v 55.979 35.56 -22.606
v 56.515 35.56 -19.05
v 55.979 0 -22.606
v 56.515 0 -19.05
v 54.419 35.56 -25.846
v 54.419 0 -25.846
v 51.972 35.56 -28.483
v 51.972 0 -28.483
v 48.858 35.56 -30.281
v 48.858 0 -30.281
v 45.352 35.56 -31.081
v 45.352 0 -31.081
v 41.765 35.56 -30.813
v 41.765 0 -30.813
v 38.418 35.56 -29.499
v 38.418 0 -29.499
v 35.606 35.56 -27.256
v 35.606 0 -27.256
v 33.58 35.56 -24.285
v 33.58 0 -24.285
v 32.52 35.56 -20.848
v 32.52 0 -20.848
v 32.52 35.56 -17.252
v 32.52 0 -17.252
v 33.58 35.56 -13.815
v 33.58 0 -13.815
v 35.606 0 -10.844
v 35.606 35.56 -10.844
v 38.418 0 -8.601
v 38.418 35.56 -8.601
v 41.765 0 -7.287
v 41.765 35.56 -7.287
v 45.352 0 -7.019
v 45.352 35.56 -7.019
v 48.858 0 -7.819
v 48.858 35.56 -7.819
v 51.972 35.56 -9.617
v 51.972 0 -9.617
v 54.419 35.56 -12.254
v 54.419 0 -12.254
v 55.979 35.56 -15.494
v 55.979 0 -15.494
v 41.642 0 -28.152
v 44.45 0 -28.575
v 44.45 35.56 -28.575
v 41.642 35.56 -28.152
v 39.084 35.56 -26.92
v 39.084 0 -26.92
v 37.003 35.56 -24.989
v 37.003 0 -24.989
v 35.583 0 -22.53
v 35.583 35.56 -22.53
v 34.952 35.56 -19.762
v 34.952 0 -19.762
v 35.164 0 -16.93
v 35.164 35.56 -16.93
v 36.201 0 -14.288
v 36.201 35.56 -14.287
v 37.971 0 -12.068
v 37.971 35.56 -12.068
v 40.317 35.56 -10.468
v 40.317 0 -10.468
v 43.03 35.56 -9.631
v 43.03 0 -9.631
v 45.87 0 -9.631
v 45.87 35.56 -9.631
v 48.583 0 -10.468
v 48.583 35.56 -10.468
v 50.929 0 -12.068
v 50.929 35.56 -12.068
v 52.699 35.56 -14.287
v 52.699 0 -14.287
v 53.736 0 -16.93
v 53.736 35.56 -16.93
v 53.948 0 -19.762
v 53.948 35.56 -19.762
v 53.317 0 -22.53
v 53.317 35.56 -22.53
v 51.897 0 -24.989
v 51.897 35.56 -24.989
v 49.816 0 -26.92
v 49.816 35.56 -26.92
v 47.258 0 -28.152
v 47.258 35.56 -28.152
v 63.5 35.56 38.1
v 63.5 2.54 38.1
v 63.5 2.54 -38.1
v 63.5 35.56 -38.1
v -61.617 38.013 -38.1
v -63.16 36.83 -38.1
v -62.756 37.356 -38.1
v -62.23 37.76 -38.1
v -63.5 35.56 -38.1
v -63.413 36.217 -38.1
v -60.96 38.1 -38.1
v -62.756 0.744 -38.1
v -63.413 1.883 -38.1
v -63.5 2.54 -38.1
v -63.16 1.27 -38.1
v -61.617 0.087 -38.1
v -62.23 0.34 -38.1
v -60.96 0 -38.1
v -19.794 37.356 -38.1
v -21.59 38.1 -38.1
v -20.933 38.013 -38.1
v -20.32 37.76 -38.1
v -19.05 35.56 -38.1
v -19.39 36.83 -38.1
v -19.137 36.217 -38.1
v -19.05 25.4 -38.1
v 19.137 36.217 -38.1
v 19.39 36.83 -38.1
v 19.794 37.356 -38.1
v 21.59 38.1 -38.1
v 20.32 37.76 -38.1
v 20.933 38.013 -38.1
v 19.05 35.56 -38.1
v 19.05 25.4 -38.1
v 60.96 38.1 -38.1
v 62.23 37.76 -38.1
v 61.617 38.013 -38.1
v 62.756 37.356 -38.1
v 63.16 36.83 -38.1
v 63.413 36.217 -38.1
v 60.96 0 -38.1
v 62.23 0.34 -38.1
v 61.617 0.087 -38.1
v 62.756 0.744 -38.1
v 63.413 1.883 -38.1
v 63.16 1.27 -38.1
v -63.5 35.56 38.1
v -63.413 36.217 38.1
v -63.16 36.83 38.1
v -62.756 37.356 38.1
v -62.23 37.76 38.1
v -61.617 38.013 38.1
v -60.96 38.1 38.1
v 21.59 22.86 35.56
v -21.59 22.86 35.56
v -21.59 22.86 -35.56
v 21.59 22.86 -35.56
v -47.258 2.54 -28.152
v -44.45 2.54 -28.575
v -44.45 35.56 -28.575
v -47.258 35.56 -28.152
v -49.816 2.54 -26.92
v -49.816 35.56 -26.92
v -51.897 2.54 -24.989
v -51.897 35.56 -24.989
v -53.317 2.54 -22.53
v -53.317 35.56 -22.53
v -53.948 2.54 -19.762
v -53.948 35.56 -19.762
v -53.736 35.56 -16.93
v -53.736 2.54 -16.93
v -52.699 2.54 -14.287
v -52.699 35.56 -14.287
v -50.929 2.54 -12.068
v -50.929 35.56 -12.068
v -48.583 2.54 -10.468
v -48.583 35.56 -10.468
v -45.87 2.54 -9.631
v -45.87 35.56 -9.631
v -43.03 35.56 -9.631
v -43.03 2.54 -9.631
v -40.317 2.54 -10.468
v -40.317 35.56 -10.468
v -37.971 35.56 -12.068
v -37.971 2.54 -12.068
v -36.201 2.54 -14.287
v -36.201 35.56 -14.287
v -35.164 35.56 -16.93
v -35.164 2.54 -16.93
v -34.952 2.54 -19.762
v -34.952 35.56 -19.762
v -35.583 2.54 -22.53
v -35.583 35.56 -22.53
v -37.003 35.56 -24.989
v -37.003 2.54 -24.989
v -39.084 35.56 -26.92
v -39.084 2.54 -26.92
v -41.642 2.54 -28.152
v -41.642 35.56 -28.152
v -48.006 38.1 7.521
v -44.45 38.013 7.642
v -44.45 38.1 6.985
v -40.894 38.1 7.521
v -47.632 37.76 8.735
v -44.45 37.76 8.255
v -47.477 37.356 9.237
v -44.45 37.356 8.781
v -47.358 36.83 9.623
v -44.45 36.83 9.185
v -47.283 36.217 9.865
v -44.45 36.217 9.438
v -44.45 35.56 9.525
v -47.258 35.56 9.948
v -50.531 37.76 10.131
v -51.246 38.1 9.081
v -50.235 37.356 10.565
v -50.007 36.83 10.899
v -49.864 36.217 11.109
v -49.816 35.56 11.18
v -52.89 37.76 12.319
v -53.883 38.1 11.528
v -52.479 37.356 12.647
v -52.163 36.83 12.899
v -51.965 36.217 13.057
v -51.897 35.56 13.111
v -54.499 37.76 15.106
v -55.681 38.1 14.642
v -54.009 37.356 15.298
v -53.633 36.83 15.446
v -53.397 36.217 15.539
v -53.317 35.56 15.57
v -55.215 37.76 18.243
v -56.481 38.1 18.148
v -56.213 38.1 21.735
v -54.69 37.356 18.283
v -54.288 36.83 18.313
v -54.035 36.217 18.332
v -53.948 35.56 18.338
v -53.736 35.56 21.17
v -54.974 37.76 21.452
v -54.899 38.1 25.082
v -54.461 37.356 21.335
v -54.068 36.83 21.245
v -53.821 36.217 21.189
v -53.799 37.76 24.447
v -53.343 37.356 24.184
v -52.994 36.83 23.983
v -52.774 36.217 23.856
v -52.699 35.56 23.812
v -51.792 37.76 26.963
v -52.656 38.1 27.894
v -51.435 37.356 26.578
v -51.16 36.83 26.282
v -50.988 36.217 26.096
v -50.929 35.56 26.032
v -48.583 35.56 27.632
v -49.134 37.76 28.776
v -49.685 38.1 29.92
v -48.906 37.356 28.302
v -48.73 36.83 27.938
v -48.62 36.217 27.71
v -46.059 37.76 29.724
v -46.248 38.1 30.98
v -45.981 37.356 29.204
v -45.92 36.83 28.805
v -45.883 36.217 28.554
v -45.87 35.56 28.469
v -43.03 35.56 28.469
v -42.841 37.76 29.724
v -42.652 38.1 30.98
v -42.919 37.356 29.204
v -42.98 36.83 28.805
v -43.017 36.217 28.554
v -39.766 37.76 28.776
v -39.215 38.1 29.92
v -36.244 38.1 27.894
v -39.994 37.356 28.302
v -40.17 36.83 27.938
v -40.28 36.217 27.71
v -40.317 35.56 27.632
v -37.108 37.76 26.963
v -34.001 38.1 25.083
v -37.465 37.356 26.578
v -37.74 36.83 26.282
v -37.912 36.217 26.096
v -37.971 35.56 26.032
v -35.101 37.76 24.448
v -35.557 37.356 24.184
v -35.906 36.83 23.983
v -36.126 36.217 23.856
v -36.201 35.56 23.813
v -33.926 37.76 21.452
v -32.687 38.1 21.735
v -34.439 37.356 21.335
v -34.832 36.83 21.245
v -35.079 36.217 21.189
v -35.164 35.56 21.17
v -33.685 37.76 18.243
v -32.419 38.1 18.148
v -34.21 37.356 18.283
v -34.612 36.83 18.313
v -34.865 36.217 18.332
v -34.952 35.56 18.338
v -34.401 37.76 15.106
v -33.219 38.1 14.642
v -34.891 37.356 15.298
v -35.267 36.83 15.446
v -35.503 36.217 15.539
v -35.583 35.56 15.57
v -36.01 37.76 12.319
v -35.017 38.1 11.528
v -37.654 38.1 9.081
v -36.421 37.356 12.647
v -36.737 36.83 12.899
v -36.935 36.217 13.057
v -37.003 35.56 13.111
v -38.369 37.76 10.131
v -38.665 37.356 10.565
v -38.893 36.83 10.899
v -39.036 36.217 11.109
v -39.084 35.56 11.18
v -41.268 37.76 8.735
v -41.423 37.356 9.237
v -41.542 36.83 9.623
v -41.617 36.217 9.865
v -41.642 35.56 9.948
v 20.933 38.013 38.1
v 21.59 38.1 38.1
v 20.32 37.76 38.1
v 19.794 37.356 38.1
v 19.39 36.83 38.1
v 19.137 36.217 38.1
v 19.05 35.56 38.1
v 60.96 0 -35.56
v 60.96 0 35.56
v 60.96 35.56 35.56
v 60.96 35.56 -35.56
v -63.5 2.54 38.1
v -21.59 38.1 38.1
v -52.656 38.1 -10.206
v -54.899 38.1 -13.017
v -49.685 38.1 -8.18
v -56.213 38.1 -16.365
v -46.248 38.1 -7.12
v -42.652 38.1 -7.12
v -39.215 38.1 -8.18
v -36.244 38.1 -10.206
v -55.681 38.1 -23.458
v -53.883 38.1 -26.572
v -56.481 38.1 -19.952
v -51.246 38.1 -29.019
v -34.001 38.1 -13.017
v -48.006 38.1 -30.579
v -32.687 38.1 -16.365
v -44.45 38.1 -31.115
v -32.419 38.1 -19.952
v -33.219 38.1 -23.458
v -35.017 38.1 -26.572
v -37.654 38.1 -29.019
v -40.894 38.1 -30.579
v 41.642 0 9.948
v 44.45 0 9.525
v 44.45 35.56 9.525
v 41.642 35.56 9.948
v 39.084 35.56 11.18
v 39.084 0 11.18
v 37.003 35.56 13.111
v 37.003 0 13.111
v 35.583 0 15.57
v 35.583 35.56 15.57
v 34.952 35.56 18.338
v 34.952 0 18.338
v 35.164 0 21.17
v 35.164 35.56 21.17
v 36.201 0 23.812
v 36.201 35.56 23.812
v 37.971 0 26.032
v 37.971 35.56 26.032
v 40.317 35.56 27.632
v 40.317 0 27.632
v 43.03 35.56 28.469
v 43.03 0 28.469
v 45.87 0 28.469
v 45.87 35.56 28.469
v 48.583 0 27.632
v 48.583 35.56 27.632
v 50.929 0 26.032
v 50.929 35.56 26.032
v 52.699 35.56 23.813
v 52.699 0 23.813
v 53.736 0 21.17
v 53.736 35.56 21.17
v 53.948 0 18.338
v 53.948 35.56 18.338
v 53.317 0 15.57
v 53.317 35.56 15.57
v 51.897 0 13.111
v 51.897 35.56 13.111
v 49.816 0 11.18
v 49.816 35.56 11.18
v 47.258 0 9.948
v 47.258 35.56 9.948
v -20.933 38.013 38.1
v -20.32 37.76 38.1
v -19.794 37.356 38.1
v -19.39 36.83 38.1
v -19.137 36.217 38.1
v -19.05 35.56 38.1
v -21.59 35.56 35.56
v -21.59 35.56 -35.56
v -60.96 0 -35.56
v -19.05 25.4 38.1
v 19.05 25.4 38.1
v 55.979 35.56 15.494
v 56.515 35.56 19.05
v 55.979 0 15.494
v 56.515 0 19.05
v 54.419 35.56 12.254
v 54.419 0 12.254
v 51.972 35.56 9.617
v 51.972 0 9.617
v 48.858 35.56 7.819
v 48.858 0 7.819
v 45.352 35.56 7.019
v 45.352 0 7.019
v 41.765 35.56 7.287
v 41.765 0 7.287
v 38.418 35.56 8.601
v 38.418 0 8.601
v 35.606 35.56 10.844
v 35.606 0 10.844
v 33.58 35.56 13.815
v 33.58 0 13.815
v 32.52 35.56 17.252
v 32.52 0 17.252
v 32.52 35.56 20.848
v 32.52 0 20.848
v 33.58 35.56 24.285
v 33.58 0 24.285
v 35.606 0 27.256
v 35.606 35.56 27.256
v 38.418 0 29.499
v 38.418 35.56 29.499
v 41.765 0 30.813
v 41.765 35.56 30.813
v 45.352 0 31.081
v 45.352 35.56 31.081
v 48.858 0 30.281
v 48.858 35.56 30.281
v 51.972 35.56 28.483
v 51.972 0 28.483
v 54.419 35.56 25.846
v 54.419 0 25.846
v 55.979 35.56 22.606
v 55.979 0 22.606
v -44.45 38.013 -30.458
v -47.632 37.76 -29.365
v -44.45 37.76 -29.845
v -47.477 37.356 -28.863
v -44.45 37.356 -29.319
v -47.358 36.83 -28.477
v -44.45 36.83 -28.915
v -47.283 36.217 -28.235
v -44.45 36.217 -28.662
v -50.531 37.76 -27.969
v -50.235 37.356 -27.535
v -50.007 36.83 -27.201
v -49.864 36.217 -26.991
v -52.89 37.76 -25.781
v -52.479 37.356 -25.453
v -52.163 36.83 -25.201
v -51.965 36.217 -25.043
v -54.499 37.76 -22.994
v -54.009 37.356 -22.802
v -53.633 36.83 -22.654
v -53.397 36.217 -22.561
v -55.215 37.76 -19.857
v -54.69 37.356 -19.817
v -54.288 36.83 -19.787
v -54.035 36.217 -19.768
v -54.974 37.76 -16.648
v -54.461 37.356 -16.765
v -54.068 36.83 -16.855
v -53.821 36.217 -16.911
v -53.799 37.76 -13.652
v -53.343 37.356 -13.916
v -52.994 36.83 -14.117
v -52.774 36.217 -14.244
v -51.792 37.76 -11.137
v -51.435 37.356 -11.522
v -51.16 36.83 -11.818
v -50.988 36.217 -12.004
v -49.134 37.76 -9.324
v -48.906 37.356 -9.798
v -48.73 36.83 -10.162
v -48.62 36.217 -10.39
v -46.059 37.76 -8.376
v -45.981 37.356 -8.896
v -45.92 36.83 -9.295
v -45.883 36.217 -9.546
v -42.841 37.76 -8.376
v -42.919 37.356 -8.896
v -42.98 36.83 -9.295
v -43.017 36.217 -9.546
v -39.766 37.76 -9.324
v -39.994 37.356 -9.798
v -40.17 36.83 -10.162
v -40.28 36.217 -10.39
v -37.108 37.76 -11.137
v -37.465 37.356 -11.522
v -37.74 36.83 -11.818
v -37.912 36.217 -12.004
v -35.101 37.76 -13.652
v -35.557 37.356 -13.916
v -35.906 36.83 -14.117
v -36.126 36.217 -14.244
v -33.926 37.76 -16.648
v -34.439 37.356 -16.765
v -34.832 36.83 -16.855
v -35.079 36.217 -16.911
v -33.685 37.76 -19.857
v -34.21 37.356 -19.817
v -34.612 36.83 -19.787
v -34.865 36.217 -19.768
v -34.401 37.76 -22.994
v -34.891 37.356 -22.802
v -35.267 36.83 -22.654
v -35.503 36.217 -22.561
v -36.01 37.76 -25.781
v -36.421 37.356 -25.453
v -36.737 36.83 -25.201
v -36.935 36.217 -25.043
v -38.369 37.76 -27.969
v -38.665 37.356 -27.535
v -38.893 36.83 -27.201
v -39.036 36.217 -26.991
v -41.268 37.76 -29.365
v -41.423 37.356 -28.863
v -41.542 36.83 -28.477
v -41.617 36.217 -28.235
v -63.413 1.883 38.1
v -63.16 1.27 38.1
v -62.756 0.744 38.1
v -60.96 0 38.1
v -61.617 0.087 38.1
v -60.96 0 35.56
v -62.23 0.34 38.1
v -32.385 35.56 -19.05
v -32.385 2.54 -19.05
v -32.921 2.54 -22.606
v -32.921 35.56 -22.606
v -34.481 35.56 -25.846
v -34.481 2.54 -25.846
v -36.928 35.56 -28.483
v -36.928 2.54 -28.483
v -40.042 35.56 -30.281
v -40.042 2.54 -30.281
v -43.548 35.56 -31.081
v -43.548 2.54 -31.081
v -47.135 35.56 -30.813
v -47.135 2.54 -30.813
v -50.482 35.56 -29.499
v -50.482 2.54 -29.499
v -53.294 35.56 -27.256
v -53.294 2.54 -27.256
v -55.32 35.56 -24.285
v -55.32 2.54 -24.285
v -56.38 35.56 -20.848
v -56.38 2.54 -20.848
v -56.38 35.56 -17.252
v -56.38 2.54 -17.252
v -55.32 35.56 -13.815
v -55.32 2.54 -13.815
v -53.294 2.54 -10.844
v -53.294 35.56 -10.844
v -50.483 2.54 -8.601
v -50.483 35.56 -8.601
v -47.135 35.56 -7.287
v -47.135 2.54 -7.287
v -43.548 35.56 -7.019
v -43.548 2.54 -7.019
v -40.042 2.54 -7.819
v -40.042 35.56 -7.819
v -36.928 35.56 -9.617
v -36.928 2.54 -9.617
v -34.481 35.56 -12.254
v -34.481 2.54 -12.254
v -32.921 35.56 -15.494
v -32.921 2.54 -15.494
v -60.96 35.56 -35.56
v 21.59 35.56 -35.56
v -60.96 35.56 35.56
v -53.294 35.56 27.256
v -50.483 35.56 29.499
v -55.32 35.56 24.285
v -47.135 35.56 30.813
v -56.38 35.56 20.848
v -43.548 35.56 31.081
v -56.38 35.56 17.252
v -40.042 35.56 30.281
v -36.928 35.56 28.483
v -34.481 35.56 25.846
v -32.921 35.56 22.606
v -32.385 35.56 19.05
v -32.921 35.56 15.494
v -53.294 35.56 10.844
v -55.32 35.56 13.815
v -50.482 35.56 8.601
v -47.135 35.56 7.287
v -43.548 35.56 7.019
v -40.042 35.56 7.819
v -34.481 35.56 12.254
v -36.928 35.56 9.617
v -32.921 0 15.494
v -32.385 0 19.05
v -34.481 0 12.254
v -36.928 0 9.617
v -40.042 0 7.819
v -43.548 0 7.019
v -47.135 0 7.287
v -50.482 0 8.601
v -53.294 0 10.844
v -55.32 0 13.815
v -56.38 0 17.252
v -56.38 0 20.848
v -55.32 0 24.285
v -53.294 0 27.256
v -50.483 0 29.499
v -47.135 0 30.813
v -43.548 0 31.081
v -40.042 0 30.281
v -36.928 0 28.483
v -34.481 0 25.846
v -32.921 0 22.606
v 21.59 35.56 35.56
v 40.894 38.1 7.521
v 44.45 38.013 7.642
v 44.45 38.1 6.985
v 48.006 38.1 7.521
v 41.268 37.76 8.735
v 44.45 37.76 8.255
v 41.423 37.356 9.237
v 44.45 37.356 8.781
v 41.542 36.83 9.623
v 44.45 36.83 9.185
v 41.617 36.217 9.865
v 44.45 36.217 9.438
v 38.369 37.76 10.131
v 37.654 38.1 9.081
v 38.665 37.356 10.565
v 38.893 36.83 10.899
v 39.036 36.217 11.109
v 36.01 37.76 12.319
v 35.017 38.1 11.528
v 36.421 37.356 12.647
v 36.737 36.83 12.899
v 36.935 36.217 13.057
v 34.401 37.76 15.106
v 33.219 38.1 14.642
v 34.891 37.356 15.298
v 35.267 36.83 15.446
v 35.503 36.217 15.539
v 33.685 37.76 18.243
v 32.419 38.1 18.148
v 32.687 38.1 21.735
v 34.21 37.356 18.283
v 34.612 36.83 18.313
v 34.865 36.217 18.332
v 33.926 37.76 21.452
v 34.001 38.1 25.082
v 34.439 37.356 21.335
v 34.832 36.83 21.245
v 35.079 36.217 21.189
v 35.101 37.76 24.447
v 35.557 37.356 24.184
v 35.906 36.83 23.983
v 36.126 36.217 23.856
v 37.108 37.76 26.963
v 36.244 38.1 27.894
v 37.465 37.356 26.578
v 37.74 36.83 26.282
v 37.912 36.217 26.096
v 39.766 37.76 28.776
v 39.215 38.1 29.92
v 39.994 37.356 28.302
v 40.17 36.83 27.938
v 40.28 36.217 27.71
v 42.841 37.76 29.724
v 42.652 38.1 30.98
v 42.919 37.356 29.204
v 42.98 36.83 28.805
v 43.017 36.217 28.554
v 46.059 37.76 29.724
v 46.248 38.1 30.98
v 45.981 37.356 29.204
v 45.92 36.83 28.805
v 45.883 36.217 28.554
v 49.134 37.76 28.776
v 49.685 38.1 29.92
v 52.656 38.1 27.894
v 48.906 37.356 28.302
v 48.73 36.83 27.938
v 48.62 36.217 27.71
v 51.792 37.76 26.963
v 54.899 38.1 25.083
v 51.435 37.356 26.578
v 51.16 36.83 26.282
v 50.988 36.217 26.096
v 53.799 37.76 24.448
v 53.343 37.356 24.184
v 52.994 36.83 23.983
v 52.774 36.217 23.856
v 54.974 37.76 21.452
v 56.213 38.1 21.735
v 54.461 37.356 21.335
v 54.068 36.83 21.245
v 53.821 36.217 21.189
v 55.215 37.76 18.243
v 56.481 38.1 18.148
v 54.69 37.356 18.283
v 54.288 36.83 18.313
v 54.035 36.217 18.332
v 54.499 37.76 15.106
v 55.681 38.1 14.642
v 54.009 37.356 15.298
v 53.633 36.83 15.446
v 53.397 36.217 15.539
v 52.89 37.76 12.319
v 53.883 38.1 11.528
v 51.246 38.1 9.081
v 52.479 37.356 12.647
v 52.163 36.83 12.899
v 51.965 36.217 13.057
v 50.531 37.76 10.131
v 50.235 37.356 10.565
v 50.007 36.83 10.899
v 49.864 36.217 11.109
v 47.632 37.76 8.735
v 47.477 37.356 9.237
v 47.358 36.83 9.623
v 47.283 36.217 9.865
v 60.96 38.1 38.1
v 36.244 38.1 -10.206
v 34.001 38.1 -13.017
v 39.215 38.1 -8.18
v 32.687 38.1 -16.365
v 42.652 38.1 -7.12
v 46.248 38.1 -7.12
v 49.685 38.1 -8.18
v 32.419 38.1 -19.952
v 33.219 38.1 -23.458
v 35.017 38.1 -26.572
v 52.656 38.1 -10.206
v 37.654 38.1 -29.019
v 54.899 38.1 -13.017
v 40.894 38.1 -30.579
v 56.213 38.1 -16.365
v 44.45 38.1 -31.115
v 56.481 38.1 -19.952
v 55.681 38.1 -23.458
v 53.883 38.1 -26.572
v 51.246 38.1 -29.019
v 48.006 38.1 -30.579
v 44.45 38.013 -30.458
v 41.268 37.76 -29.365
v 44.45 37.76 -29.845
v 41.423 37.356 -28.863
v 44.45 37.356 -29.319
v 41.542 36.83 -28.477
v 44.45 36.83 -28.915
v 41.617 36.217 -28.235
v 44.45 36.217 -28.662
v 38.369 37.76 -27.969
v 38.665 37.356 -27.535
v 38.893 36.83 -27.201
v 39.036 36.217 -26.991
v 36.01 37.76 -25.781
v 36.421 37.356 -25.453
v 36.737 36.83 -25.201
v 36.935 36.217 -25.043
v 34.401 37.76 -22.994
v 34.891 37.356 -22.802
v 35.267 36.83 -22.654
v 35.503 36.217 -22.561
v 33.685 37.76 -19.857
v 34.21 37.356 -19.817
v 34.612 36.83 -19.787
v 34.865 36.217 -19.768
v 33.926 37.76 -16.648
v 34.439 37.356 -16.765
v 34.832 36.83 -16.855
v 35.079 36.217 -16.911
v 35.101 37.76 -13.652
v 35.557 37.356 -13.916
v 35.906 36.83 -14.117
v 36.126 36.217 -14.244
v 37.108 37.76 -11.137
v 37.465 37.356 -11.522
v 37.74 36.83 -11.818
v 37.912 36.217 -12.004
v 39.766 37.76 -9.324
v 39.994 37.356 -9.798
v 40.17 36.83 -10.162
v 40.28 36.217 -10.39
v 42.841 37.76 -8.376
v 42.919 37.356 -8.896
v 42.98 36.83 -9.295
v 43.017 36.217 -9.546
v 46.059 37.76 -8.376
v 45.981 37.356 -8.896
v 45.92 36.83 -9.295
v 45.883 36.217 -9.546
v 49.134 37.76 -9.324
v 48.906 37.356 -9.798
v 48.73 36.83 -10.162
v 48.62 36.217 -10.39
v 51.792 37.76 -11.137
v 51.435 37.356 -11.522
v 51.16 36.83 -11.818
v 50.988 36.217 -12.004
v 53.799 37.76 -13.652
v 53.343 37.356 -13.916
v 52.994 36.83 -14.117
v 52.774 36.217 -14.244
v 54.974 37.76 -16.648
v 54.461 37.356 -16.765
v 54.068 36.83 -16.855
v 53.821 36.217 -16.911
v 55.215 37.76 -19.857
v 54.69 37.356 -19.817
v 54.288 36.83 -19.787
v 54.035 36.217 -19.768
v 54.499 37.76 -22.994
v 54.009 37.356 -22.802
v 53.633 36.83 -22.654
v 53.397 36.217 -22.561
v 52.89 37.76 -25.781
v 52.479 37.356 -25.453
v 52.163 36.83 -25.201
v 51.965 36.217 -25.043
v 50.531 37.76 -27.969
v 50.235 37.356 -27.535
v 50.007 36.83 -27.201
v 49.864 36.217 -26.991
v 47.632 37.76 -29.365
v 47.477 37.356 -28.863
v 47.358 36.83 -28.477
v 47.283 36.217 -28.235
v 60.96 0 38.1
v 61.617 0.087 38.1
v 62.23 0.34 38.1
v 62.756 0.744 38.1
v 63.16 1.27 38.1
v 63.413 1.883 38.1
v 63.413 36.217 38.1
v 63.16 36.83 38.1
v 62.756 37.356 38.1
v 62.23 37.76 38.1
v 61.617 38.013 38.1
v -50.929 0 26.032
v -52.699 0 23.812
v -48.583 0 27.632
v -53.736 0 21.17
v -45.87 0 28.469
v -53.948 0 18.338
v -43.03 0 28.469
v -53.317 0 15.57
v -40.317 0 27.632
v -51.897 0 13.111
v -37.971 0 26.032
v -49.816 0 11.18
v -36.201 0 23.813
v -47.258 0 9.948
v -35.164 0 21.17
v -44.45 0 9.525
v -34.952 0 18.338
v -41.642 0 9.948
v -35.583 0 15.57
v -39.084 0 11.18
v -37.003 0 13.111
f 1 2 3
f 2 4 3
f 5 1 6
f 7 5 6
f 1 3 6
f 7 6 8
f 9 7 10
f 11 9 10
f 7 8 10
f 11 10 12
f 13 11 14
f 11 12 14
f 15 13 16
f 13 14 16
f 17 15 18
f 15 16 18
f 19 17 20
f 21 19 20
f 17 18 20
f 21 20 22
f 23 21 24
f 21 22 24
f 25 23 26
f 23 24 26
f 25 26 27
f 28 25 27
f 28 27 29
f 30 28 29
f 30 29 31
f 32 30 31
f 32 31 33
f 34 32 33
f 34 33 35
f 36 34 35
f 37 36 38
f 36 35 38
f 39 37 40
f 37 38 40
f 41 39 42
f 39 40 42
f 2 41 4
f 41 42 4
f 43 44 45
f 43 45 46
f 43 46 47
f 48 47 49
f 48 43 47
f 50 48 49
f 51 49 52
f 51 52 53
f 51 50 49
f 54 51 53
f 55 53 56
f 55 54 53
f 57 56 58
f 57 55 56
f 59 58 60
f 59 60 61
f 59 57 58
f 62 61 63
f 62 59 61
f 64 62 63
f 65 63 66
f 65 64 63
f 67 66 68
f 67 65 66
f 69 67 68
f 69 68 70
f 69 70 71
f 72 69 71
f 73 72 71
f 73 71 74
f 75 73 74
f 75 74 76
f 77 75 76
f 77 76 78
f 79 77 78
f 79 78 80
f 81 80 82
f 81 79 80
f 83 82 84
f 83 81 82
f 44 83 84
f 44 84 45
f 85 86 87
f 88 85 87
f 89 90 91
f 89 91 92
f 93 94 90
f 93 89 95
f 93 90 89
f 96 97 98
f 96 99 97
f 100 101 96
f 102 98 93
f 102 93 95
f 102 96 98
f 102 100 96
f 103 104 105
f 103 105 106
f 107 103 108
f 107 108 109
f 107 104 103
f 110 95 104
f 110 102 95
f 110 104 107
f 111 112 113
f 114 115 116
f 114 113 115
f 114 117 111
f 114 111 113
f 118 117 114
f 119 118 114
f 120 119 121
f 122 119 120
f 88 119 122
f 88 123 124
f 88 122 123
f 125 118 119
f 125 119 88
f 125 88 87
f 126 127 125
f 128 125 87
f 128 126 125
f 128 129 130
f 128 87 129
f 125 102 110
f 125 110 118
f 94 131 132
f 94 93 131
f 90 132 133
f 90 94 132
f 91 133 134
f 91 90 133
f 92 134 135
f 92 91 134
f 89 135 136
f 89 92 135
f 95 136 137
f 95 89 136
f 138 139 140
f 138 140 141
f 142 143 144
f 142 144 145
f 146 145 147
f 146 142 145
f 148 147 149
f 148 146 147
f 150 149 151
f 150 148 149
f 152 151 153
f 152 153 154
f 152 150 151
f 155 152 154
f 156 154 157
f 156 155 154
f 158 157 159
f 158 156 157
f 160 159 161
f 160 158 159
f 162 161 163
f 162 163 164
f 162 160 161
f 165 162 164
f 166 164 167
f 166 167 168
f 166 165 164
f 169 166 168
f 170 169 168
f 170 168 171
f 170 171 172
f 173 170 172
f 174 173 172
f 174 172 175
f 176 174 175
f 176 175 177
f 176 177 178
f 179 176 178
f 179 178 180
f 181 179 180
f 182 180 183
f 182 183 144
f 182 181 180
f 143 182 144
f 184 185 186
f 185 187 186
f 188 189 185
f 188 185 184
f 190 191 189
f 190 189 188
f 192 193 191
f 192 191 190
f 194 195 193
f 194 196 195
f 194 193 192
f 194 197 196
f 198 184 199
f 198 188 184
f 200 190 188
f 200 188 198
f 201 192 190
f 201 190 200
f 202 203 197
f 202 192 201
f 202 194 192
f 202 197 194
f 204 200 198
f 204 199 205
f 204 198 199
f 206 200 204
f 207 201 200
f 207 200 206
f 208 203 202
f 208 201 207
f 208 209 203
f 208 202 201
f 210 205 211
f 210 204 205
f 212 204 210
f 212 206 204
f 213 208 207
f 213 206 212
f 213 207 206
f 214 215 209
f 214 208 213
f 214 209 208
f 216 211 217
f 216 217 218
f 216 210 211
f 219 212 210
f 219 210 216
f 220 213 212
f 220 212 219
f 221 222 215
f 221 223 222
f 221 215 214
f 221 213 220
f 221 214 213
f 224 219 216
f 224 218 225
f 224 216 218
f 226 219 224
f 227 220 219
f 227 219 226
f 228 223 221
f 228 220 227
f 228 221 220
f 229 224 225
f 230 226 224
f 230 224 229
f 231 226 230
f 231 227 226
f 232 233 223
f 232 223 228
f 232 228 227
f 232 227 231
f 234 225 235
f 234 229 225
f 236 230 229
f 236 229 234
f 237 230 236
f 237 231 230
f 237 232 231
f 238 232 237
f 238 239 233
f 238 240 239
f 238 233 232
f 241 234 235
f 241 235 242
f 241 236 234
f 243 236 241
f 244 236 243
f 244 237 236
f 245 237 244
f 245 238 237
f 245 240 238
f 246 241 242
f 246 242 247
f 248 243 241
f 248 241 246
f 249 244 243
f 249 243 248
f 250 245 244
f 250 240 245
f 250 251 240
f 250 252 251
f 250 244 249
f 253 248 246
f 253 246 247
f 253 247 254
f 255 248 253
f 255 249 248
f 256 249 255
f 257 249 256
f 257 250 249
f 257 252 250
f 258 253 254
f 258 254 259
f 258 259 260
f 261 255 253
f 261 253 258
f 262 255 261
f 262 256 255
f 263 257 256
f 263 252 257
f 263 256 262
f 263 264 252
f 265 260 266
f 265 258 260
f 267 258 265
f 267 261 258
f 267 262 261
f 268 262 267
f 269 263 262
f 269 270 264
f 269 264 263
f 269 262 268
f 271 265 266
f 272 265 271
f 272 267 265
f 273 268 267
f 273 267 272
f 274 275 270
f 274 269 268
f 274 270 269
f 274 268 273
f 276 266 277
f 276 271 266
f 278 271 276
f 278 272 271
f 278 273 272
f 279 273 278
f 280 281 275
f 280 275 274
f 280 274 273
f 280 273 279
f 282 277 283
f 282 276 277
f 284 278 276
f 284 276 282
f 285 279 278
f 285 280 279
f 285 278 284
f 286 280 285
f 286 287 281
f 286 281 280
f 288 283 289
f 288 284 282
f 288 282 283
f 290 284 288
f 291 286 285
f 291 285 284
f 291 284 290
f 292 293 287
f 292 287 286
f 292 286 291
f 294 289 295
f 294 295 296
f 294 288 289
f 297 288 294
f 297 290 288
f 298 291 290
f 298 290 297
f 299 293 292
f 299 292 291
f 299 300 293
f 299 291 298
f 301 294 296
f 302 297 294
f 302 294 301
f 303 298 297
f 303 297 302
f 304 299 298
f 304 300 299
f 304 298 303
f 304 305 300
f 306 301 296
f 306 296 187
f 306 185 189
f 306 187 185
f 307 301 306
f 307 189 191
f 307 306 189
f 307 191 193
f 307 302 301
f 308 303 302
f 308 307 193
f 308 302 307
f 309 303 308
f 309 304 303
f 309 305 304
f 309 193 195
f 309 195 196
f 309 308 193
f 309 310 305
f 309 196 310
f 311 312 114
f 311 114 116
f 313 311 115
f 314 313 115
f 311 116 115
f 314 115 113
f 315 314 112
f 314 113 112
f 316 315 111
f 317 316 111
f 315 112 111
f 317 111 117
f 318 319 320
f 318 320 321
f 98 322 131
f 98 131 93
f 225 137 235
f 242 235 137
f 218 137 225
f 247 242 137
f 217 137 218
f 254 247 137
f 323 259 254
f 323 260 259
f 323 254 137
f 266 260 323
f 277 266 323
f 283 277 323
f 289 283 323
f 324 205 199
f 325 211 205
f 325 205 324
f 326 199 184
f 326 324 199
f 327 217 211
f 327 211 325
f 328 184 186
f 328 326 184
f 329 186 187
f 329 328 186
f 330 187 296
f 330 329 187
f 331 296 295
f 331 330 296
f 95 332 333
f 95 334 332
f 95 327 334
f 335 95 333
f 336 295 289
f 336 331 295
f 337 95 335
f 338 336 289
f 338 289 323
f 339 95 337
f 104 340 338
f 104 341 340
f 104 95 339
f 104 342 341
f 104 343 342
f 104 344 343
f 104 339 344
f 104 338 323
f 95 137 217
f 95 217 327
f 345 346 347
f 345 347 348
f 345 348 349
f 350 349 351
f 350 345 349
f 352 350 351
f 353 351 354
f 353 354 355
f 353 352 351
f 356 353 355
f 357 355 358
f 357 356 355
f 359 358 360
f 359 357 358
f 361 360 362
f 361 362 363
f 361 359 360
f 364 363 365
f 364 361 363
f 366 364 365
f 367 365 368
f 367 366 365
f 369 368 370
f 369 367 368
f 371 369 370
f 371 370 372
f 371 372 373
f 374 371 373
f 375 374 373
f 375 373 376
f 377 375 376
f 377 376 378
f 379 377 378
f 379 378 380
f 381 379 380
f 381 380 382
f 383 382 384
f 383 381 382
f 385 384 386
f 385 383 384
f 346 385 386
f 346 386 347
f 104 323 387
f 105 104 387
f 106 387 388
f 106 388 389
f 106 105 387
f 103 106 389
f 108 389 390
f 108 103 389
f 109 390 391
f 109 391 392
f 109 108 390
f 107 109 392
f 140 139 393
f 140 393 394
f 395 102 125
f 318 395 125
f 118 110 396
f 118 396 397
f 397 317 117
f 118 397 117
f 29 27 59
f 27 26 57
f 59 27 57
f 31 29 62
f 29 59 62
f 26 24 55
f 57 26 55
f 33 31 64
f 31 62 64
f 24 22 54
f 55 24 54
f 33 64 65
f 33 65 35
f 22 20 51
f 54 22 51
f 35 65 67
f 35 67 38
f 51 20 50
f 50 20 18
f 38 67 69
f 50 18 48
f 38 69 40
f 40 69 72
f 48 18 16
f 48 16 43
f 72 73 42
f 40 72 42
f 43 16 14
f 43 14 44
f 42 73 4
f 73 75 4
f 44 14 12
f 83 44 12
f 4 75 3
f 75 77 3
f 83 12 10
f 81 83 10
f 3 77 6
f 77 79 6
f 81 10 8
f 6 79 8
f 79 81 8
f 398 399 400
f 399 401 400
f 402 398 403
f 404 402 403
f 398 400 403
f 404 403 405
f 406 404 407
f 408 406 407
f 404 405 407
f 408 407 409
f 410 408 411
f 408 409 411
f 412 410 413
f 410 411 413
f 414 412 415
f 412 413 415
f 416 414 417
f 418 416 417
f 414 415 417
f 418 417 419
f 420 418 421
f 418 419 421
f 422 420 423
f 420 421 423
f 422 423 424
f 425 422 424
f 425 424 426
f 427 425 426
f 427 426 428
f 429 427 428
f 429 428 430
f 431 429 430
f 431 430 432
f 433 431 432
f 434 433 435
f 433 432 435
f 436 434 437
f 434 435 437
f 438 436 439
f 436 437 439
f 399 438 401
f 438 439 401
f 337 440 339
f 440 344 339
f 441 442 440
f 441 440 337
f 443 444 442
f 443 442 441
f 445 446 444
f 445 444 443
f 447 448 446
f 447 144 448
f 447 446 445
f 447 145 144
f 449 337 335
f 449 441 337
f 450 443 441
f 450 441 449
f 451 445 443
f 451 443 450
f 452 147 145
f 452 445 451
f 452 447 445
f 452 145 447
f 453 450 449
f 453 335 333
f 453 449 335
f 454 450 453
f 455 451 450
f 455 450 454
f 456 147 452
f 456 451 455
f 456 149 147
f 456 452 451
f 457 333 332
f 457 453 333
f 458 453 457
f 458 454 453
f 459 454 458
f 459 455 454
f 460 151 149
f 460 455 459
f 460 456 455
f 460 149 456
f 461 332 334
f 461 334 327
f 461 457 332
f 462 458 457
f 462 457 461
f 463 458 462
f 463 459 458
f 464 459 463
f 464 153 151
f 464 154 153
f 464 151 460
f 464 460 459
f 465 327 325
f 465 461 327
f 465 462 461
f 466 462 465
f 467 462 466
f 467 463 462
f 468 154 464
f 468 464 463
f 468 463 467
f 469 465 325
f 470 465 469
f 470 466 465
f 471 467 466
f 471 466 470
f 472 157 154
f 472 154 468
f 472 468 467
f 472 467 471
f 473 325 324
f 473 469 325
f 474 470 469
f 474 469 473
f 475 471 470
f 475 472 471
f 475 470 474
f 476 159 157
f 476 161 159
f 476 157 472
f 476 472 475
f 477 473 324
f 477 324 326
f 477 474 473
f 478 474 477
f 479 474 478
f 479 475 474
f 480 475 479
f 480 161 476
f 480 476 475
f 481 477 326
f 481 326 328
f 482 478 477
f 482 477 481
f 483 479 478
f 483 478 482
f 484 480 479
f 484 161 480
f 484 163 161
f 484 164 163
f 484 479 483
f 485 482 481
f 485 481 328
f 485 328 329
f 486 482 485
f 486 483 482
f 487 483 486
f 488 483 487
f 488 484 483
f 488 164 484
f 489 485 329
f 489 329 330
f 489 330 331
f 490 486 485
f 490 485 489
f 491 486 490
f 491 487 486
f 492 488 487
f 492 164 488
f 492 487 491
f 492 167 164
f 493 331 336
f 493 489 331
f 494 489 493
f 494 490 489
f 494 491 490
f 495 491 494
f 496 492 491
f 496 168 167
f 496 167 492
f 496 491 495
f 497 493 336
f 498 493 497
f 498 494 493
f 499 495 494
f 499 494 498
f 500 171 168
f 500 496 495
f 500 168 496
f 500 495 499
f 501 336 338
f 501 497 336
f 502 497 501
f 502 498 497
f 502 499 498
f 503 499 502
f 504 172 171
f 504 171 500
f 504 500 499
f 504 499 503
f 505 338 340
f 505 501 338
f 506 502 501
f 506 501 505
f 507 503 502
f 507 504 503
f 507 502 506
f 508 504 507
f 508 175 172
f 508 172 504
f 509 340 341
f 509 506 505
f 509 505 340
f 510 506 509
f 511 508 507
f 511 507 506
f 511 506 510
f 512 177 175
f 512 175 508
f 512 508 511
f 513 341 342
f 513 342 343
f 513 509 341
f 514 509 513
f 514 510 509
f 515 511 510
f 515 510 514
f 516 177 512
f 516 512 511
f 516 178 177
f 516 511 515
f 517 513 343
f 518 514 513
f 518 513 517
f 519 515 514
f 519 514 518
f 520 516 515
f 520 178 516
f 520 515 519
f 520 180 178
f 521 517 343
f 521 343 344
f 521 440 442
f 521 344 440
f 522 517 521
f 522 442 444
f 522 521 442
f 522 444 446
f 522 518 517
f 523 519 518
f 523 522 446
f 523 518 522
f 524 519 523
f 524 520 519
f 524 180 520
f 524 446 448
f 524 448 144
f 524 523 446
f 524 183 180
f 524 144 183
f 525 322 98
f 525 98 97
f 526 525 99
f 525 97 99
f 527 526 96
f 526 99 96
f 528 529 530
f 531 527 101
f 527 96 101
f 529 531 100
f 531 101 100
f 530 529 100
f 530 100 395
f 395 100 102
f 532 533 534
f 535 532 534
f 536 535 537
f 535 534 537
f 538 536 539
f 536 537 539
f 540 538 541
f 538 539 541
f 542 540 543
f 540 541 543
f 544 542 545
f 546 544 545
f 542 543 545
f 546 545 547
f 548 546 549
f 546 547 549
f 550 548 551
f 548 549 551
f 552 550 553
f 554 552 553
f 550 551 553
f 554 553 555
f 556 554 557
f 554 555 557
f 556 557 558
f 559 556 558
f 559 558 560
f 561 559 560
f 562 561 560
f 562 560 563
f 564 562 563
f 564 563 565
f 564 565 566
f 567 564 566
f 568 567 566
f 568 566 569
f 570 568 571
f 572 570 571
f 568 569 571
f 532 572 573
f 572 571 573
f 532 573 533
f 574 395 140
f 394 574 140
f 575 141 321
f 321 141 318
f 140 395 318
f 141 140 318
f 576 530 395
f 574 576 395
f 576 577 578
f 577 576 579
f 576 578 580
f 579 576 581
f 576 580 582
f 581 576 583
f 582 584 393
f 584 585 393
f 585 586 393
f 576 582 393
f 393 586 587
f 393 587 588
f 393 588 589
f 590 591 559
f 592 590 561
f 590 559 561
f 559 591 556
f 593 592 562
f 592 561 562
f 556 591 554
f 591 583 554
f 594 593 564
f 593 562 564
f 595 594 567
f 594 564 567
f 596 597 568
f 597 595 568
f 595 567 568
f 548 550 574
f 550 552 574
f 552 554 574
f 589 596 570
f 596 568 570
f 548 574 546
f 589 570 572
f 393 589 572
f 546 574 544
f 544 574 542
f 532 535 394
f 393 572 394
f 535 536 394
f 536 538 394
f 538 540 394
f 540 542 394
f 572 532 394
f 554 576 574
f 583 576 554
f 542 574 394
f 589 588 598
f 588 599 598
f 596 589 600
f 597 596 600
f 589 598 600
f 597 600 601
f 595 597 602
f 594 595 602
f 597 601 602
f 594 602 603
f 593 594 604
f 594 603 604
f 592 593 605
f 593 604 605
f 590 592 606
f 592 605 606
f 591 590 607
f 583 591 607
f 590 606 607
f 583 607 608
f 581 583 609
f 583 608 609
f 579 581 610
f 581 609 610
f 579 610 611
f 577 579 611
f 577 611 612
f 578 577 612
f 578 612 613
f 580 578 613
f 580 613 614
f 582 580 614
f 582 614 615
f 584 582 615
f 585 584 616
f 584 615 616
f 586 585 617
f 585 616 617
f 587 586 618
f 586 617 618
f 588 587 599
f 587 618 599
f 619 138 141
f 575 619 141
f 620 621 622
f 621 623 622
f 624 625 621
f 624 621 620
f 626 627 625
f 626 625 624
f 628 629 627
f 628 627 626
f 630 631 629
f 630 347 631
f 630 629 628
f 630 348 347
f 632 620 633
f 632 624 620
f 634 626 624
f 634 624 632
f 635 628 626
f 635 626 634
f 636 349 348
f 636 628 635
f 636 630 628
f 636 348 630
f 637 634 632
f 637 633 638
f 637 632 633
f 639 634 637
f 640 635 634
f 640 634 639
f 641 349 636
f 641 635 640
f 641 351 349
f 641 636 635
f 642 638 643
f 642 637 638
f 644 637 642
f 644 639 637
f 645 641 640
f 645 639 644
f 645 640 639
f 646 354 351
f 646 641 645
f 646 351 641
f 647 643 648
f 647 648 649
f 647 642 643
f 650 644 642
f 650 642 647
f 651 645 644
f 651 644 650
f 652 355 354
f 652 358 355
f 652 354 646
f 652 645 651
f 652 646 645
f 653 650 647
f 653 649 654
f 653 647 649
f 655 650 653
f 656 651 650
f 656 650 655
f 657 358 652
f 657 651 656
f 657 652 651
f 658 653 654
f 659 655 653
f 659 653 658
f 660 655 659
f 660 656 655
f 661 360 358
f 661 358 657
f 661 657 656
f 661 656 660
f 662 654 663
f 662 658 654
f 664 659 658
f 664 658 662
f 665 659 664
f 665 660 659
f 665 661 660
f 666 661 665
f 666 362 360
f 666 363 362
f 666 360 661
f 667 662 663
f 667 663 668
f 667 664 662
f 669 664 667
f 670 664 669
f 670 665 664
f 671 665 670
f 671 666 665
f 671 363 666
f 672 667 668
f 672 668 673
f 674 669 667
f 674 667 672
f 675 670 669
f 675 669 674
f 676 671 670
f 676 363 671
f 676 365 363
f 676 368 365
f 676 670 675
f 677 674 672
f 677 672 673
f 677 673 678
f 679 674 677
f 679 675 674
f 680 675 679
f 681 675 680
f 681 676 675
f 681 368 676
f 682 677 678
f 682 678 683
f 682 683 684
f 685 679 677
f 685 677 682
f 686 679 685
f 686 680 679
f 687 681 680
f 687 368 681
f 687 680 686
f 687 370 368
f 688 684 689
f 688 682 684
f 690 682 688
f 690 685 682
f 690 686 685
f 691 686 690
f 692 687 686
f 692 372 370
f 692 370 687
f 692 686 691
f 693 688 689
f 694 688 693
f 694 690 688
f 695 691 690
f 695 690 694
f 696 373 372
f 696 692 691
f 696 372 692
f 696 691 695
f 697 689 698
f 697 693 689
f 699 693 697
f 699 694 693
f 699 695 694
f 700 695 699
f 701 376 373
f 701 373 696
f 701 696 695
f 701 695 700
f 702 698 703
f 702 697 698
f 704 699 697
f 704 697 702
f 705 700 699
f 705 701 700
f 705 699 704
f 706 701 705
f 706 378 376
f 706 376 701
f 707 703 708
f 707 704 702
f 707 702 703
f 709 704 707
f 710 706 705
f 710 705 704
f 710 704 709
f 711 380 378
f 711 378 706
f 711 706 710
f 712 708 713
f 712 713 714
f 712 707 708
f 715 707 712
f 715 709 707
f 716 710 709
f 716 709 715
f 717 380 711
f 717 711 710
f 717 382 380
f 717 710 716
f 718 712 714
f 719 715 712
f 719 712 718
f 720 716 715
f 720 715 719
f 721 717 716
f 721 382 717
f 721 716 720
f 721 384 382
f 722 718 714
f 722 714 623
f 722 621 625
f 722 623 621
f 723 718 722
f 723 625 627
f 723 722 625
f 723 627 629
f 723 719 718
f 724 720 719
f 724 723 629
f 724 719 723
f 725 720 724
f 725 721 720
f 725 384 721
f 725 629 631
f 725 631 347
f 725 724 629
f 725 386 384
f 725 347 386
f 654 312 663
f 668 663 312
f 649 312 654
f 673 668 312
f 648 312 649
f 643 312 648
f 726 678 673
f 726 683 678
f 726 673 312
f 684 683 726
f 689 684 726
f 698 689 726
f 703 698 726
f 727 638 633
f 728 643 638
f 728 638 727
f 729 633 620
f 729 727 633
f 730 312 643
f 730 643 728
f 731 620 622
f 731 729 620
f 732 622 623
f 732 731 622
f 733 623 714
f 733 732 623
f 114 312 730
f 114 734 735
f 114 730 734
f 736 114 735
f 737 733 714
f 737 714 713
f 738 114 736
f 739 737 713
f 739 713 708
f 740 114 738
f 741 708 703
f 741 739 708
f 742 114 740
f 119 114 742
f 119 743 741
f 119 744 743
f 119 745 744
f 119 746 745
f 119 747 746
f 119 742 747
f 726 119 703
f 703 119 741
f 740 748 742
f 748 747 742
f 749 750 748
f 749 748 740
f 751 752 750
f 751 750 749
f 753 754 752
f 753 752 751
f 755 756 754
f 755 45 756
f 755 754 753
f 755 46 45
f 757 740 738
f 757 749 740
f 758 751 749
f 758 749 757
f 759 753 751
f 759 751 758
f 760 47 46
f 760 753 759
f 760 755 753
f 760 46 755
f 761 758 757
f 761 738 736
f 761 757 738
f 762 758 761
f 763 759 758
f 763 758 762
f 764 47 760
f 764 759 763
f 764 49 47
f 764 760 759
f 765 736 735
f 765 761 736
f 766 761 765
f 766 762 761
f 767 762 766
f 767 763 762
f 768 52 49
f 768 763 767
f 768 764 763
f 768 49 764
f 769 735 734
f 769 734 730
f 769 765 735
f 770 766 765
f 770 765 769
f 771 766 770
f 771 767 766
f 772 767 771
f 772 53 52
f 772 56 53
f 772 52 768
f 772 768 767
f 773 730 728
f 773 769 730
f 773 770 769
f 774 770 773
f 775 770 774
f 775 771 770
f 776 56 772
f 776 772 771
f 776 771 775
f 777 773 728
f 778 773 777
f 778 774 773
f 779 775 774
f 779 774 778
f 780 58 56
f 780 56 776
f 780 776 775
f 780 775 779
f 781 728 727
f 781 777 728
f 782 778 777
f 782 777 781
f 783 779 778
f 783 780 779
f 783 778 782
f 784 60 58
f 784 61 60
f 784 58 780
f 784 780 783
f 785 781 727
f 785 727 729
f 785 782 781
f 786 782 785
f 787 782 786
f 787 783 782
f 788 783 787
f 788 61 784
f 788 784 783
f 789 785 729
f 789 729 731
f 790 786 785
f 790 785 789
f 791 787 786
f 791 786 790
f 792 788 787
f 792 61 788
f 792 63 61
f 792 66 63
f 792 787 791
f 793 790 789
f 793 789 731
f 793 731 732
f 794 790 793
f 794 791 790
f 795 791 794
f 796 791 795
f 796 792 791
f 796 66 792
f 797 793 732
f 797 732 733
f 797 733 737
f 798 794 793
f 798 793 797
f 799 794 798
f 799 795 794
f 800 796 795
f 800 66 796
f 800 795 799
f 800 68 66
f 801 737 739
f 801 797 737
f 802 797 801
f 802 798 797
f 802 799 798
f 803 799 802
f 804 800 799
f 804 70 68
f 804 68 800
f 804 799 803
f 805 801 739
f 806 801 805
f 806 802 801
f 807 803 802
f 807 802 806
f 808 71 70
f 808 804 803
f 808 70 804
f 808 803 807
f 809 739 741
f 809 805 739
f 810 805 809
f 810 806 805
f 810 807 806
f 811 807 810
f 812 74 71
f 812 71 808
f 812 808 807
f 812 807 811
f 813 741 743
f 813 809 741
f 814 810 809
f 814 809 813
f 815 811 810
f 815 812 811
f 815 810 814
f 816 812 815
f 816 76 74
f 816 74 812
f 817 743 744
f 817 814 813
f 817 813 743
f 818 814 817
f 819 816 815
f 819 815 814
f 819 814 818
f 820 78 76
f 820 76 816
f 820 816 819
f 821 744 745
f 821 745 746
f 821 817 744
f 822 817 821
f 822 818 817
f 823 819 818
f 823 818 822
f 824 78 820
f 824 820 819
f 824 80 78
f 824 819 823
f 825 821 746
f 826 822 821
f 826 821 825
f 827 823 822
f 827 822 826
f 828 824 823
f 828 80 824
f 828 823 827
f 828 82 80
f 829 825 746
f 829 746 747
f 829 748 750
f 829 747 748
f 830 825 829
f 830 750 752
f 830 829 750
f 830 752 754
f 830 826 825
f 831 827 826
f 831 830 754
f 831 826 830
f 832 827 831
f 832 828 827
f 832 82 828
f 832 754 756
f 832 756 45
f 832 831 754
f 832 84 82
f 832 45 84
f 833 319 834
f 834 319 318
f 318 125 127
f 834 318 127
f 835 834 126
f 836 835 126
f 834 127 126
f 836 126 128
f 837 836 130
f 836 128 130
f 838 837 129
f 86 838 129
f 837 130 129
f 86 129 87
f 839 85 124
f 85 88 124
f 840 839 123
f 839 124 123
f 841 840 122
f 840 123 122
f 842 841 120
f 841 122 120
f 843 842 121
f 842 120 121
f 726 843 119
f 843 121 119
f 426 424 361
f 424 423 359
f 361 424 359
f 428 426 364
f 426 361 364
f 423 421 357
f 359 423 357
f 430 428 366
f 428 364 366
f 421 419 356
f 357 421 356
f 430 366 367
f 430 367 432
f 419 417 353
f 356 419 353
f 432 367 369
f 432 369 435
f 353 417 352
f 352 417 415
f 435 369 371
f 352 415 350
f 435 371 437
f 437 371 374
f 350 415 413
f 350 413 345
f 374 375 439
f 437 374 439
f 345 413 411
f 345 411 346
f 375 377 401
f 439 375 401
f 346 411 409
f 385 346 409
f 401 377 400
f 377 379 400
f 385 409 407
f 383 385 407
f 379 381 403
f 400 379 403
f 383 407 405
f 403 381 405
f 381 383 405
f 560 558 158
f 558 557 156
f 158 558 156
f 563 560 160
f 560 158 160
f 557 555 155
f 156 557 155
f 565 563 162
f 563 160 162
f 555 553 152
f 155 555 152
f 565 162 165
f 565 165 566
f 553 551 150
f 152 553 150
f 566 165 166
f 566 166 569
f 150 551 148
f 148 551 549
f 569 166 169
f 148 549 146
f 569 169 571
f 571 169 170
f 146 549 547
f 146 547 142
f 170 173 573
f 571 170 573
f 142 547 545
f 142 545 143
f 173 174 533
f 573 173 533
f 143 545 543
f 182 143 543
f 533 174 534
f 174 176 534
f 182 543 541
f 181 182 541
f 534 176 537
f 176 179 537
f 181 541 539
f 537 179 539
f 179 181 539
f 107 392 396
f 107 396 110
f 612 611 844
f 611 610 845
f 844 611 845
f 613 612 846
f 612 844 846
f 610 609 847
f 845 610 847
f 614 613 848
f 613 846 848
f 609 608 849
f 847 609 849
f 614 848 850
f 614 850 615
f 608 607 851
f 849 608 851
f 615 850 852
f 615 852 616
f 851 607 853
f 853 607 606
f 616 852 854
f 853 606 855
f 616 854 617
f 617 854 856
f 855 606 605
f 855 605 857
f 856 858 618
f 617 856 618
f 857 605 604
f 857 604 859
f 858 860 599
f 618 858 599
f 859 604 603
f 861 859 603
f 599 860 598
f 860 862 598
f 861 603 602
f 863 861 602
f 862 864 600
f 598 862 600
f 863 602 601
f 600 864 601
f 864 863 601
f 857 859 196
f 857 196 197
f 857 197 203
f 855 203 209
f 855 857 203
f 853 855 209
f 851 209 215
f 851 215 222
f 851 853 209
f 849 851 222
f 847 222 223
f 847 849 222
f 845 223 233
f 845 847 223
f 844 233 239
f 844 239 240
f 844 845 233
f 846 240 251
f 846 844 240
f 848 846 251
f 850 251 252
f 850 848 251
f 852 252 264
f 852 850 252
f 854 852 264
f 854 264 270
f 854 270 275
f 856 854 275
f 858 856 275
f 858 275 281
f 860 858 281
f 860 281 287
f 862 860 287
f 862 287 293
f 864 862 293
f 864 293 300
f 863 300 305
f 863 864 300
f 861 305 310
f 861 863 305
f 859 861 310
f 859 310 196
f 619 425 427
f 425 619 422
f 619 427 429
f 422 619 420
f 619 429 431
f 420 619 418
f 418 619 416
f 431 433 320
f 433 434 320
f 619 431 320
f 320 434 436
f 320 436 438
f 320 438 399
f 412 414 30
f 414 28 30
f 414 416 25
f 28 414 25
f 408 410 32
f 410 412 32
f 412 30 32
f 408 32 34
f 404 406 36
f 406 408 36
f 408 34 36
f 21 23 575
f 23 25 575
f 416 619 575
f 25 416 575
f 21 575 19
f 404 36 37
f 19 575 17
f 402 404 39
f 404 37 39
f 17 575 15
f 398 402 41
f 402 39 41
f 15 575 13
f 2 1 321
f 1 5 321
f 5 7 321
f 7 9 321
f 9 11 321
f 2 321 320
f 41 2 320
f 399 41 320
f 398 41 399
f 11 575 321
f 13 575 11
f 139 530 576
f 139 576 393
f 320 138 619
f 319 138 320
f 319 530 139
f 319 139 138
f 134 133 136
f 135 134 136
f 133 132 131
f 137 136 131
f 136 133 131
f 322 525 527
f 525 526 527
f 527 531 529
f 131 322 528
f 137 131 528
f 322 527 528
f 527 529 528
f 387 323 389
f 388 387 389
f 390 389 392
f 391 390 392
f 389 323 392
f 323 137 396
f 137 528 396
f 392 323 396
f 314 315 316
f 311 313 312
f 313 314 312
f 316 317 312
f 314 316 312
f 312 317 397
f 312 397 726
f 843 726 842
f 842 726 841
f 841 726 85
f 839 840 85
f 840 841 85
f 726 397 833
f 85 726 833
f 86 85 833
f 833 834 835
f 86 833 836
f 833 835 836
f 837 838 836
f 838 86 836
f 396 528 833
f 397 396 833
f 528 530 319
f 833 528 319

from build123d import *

# Parameters (mm, degrees)
SKETCH1_W           = 127
SKETCH1_H           = 76.2
SKETCH1_R           = 9.525
BOSS_EXTRUDE1_DEPTH = 38.1
SKETCH2_W           = 38.1
SKETCH2_H           = 76.2
CUT_EXTRUDE1_DEPTH  = 12.7
FILLET1_R           = 2.54
SHELL1_OUTLINE_W    = 121.92
SHELL1_OUTLINE_H    = 71.12
SHELL1_OUTLINE_R    = 12.065
SHELL1_DEPTH        = 22.86
SHELL1_START        = 22.86
SHELL1_2_OUTLINE_W  = 39.37
SHELL1_2_OUTLINE_H  = 71.12
SHELL1_2_OUTLINE_R  = 12.065
SHELL1_2_DEPTH      = 12.7
SHELL1_3_OUTLINE_R  = 12.065
SHELL1_3_DEPTH      = 2.54


# Read off the part's stored shape, not the designer's step: Shell1
with BuildPart() as part:
    # Sketch1 → Boss-Extrude1 (new body)
    with BuildSketch(Plane(origin=(0, 0, 0), x_dir=(1, 0, 0), z_dir=(0, 1, 0))):
        Rectangle(SKETCH1_W, SKETCH1_H)
        with Locations(Location((-44.45, 19.05, 0), (0, 0, 90))):
            Circle(SKETCH1_R, mode=Mode.SUBTRACT)
        with Locations(Location((44.45, 19.05, 0), (0, 0, 90))):
            Circle(SKETCH1_R, mode=Mode.SUBTRACT)
        with Locations(Location((-44.45, -19.05, 0), (0, 0, 90))):
            Circle(SKETCH1_R, mode=Mode.SUBTRACT)
        with Locations(Location((44.45, -19.05, 0), (0, 0, 90))):
            Circle(SKETCH1_R, mode=Mode.SUBTRACT)
    extrude(amount=BOSS_EXTRUDE1_DEPTH)

    # Sketch2 → Cut-Extrude1 (cut)
    with BuildSketch(Plane(origin=(0, 38.1, 0), x_dir=(1, 0, 0), z_dir=(0, 1, 0))):
        Rectangle(SKETCH2_W, SKETCH2_H)
    extrude(amount=-CUT_EXTRUDE1_DEPTH, mode=Mode.SUBTRACT)

    # Fillet1
    fillet1_edges = [part.edges().sort_by_distance(p)[0] for p in [
        (-44.45, 0, -9.525),
        (-44.45, 38.1, -9.525),
        (-63.5, 38.1, 0),
        (44.45, 38.1, -9.525),
        (-44.45, 38.1, 28.575),
        (44.45, 38.1, 28.575),
        (19.05, 38.1, 0),
        (-19.05, 38.1, 0),
        (63.5, 38.1, 0),
        (-63.5, 0, 0),
        (63.5, 0, 0),
    ]]
    fillet(fillet1_edges, radius=FILLET1_R)

    # Shell1 outline → Shell1 (cut)
    with BuildSketch(Plane(origin=(0, 0, 0), x_dir=(1, 0, 0), z_dir=(0, 1, 0))):
        Rectangle(SHELL1_OUTLINE_W, SHELL1_OUTLINE_H)
        with Locations((44.45, -19.05)):
            Circle(SHELL1_OUTLINE_R, mode=Mode.SUBTRACT)
        with Locations((44.45, 19.05)):
            Circle(SHELL1_OUTLINE_R, mode=Mode.SUBTRACT)
        with Locations((-44.45, 19.05)):
            Circle(SHELL1_OUTLINE_R, mode=Mode.SUBTRACT)
        with Locations((-44.45, -19.05)):
            Circle(SHELL1_OUTLINE_R, mode=Mode.SUBTRACT)
    extrude(amount=SHELL1_DEPTH, mode=Mode.SUBTRACT)

    # Shell1 2 outline → Shell1 2 (cut)
    # profile 1 of 2: a face of its own
    with BuildSketch(Plane(origin=(0, 0, 0), x_dir=(1, 0, 0), z_dir=(0, 1, 0)).offset(SHELL1_START)):
        with Locations((41.275, 0)):
            Rectangle(SHELL1_2_OUTLINE_W, SHELL1_2_OUTLINE_H)
        with Locations((44.45, -19.05)):
            Circle(SHELL1_2_OUTLINE_R, mode=Mode.SUBTRACT)
        with Locations((44.45, 19.05)):
            Circle(SHELL1_2_OUTLINE_R, mode=Mode.SUBTRACT)
    # profile 2 of 2: a face of its own
    with BuildSketch(Plane(origin=(0, 0, 0), x_dir=(1, 0, 0), z_dir=(0, 1, 0)).offset(SHELL1_START)):
        with Locations((-41.275, 0)):
            Rectangle(SHELL1_2_OUTLINE_W, SHELL1_2_OUTLINE_H)
        with Locations((-44.45, -19.05)):
            Circle(SHELL1_2_OUTLINE_R, mode=Mode.SUBTRACT)
        with Locations((-44.45, 19.05)):
            Circle(SHELL1_2_OUTLINE_R, mode=Mode.SUBTRACT)
    extrude(amount=SHELL1_2_DEPTH, mode=Mode.SUBTRACT)

    # Shell1 3 outline → Shell1 3 (cut)
    with BuildSketch(Plane(origin=(0, 0, 0), x_dir=(1, 0, 0), z_dir=(0, 1, 0))):
        with Locations((-44.45, 19.05)):
            Circle(SHELL1_3_OUTLINE_R)
    extrude(amount=SHELL1_3_DEPTH, mode=Mode.SUBTRACT)


solid = part.part
